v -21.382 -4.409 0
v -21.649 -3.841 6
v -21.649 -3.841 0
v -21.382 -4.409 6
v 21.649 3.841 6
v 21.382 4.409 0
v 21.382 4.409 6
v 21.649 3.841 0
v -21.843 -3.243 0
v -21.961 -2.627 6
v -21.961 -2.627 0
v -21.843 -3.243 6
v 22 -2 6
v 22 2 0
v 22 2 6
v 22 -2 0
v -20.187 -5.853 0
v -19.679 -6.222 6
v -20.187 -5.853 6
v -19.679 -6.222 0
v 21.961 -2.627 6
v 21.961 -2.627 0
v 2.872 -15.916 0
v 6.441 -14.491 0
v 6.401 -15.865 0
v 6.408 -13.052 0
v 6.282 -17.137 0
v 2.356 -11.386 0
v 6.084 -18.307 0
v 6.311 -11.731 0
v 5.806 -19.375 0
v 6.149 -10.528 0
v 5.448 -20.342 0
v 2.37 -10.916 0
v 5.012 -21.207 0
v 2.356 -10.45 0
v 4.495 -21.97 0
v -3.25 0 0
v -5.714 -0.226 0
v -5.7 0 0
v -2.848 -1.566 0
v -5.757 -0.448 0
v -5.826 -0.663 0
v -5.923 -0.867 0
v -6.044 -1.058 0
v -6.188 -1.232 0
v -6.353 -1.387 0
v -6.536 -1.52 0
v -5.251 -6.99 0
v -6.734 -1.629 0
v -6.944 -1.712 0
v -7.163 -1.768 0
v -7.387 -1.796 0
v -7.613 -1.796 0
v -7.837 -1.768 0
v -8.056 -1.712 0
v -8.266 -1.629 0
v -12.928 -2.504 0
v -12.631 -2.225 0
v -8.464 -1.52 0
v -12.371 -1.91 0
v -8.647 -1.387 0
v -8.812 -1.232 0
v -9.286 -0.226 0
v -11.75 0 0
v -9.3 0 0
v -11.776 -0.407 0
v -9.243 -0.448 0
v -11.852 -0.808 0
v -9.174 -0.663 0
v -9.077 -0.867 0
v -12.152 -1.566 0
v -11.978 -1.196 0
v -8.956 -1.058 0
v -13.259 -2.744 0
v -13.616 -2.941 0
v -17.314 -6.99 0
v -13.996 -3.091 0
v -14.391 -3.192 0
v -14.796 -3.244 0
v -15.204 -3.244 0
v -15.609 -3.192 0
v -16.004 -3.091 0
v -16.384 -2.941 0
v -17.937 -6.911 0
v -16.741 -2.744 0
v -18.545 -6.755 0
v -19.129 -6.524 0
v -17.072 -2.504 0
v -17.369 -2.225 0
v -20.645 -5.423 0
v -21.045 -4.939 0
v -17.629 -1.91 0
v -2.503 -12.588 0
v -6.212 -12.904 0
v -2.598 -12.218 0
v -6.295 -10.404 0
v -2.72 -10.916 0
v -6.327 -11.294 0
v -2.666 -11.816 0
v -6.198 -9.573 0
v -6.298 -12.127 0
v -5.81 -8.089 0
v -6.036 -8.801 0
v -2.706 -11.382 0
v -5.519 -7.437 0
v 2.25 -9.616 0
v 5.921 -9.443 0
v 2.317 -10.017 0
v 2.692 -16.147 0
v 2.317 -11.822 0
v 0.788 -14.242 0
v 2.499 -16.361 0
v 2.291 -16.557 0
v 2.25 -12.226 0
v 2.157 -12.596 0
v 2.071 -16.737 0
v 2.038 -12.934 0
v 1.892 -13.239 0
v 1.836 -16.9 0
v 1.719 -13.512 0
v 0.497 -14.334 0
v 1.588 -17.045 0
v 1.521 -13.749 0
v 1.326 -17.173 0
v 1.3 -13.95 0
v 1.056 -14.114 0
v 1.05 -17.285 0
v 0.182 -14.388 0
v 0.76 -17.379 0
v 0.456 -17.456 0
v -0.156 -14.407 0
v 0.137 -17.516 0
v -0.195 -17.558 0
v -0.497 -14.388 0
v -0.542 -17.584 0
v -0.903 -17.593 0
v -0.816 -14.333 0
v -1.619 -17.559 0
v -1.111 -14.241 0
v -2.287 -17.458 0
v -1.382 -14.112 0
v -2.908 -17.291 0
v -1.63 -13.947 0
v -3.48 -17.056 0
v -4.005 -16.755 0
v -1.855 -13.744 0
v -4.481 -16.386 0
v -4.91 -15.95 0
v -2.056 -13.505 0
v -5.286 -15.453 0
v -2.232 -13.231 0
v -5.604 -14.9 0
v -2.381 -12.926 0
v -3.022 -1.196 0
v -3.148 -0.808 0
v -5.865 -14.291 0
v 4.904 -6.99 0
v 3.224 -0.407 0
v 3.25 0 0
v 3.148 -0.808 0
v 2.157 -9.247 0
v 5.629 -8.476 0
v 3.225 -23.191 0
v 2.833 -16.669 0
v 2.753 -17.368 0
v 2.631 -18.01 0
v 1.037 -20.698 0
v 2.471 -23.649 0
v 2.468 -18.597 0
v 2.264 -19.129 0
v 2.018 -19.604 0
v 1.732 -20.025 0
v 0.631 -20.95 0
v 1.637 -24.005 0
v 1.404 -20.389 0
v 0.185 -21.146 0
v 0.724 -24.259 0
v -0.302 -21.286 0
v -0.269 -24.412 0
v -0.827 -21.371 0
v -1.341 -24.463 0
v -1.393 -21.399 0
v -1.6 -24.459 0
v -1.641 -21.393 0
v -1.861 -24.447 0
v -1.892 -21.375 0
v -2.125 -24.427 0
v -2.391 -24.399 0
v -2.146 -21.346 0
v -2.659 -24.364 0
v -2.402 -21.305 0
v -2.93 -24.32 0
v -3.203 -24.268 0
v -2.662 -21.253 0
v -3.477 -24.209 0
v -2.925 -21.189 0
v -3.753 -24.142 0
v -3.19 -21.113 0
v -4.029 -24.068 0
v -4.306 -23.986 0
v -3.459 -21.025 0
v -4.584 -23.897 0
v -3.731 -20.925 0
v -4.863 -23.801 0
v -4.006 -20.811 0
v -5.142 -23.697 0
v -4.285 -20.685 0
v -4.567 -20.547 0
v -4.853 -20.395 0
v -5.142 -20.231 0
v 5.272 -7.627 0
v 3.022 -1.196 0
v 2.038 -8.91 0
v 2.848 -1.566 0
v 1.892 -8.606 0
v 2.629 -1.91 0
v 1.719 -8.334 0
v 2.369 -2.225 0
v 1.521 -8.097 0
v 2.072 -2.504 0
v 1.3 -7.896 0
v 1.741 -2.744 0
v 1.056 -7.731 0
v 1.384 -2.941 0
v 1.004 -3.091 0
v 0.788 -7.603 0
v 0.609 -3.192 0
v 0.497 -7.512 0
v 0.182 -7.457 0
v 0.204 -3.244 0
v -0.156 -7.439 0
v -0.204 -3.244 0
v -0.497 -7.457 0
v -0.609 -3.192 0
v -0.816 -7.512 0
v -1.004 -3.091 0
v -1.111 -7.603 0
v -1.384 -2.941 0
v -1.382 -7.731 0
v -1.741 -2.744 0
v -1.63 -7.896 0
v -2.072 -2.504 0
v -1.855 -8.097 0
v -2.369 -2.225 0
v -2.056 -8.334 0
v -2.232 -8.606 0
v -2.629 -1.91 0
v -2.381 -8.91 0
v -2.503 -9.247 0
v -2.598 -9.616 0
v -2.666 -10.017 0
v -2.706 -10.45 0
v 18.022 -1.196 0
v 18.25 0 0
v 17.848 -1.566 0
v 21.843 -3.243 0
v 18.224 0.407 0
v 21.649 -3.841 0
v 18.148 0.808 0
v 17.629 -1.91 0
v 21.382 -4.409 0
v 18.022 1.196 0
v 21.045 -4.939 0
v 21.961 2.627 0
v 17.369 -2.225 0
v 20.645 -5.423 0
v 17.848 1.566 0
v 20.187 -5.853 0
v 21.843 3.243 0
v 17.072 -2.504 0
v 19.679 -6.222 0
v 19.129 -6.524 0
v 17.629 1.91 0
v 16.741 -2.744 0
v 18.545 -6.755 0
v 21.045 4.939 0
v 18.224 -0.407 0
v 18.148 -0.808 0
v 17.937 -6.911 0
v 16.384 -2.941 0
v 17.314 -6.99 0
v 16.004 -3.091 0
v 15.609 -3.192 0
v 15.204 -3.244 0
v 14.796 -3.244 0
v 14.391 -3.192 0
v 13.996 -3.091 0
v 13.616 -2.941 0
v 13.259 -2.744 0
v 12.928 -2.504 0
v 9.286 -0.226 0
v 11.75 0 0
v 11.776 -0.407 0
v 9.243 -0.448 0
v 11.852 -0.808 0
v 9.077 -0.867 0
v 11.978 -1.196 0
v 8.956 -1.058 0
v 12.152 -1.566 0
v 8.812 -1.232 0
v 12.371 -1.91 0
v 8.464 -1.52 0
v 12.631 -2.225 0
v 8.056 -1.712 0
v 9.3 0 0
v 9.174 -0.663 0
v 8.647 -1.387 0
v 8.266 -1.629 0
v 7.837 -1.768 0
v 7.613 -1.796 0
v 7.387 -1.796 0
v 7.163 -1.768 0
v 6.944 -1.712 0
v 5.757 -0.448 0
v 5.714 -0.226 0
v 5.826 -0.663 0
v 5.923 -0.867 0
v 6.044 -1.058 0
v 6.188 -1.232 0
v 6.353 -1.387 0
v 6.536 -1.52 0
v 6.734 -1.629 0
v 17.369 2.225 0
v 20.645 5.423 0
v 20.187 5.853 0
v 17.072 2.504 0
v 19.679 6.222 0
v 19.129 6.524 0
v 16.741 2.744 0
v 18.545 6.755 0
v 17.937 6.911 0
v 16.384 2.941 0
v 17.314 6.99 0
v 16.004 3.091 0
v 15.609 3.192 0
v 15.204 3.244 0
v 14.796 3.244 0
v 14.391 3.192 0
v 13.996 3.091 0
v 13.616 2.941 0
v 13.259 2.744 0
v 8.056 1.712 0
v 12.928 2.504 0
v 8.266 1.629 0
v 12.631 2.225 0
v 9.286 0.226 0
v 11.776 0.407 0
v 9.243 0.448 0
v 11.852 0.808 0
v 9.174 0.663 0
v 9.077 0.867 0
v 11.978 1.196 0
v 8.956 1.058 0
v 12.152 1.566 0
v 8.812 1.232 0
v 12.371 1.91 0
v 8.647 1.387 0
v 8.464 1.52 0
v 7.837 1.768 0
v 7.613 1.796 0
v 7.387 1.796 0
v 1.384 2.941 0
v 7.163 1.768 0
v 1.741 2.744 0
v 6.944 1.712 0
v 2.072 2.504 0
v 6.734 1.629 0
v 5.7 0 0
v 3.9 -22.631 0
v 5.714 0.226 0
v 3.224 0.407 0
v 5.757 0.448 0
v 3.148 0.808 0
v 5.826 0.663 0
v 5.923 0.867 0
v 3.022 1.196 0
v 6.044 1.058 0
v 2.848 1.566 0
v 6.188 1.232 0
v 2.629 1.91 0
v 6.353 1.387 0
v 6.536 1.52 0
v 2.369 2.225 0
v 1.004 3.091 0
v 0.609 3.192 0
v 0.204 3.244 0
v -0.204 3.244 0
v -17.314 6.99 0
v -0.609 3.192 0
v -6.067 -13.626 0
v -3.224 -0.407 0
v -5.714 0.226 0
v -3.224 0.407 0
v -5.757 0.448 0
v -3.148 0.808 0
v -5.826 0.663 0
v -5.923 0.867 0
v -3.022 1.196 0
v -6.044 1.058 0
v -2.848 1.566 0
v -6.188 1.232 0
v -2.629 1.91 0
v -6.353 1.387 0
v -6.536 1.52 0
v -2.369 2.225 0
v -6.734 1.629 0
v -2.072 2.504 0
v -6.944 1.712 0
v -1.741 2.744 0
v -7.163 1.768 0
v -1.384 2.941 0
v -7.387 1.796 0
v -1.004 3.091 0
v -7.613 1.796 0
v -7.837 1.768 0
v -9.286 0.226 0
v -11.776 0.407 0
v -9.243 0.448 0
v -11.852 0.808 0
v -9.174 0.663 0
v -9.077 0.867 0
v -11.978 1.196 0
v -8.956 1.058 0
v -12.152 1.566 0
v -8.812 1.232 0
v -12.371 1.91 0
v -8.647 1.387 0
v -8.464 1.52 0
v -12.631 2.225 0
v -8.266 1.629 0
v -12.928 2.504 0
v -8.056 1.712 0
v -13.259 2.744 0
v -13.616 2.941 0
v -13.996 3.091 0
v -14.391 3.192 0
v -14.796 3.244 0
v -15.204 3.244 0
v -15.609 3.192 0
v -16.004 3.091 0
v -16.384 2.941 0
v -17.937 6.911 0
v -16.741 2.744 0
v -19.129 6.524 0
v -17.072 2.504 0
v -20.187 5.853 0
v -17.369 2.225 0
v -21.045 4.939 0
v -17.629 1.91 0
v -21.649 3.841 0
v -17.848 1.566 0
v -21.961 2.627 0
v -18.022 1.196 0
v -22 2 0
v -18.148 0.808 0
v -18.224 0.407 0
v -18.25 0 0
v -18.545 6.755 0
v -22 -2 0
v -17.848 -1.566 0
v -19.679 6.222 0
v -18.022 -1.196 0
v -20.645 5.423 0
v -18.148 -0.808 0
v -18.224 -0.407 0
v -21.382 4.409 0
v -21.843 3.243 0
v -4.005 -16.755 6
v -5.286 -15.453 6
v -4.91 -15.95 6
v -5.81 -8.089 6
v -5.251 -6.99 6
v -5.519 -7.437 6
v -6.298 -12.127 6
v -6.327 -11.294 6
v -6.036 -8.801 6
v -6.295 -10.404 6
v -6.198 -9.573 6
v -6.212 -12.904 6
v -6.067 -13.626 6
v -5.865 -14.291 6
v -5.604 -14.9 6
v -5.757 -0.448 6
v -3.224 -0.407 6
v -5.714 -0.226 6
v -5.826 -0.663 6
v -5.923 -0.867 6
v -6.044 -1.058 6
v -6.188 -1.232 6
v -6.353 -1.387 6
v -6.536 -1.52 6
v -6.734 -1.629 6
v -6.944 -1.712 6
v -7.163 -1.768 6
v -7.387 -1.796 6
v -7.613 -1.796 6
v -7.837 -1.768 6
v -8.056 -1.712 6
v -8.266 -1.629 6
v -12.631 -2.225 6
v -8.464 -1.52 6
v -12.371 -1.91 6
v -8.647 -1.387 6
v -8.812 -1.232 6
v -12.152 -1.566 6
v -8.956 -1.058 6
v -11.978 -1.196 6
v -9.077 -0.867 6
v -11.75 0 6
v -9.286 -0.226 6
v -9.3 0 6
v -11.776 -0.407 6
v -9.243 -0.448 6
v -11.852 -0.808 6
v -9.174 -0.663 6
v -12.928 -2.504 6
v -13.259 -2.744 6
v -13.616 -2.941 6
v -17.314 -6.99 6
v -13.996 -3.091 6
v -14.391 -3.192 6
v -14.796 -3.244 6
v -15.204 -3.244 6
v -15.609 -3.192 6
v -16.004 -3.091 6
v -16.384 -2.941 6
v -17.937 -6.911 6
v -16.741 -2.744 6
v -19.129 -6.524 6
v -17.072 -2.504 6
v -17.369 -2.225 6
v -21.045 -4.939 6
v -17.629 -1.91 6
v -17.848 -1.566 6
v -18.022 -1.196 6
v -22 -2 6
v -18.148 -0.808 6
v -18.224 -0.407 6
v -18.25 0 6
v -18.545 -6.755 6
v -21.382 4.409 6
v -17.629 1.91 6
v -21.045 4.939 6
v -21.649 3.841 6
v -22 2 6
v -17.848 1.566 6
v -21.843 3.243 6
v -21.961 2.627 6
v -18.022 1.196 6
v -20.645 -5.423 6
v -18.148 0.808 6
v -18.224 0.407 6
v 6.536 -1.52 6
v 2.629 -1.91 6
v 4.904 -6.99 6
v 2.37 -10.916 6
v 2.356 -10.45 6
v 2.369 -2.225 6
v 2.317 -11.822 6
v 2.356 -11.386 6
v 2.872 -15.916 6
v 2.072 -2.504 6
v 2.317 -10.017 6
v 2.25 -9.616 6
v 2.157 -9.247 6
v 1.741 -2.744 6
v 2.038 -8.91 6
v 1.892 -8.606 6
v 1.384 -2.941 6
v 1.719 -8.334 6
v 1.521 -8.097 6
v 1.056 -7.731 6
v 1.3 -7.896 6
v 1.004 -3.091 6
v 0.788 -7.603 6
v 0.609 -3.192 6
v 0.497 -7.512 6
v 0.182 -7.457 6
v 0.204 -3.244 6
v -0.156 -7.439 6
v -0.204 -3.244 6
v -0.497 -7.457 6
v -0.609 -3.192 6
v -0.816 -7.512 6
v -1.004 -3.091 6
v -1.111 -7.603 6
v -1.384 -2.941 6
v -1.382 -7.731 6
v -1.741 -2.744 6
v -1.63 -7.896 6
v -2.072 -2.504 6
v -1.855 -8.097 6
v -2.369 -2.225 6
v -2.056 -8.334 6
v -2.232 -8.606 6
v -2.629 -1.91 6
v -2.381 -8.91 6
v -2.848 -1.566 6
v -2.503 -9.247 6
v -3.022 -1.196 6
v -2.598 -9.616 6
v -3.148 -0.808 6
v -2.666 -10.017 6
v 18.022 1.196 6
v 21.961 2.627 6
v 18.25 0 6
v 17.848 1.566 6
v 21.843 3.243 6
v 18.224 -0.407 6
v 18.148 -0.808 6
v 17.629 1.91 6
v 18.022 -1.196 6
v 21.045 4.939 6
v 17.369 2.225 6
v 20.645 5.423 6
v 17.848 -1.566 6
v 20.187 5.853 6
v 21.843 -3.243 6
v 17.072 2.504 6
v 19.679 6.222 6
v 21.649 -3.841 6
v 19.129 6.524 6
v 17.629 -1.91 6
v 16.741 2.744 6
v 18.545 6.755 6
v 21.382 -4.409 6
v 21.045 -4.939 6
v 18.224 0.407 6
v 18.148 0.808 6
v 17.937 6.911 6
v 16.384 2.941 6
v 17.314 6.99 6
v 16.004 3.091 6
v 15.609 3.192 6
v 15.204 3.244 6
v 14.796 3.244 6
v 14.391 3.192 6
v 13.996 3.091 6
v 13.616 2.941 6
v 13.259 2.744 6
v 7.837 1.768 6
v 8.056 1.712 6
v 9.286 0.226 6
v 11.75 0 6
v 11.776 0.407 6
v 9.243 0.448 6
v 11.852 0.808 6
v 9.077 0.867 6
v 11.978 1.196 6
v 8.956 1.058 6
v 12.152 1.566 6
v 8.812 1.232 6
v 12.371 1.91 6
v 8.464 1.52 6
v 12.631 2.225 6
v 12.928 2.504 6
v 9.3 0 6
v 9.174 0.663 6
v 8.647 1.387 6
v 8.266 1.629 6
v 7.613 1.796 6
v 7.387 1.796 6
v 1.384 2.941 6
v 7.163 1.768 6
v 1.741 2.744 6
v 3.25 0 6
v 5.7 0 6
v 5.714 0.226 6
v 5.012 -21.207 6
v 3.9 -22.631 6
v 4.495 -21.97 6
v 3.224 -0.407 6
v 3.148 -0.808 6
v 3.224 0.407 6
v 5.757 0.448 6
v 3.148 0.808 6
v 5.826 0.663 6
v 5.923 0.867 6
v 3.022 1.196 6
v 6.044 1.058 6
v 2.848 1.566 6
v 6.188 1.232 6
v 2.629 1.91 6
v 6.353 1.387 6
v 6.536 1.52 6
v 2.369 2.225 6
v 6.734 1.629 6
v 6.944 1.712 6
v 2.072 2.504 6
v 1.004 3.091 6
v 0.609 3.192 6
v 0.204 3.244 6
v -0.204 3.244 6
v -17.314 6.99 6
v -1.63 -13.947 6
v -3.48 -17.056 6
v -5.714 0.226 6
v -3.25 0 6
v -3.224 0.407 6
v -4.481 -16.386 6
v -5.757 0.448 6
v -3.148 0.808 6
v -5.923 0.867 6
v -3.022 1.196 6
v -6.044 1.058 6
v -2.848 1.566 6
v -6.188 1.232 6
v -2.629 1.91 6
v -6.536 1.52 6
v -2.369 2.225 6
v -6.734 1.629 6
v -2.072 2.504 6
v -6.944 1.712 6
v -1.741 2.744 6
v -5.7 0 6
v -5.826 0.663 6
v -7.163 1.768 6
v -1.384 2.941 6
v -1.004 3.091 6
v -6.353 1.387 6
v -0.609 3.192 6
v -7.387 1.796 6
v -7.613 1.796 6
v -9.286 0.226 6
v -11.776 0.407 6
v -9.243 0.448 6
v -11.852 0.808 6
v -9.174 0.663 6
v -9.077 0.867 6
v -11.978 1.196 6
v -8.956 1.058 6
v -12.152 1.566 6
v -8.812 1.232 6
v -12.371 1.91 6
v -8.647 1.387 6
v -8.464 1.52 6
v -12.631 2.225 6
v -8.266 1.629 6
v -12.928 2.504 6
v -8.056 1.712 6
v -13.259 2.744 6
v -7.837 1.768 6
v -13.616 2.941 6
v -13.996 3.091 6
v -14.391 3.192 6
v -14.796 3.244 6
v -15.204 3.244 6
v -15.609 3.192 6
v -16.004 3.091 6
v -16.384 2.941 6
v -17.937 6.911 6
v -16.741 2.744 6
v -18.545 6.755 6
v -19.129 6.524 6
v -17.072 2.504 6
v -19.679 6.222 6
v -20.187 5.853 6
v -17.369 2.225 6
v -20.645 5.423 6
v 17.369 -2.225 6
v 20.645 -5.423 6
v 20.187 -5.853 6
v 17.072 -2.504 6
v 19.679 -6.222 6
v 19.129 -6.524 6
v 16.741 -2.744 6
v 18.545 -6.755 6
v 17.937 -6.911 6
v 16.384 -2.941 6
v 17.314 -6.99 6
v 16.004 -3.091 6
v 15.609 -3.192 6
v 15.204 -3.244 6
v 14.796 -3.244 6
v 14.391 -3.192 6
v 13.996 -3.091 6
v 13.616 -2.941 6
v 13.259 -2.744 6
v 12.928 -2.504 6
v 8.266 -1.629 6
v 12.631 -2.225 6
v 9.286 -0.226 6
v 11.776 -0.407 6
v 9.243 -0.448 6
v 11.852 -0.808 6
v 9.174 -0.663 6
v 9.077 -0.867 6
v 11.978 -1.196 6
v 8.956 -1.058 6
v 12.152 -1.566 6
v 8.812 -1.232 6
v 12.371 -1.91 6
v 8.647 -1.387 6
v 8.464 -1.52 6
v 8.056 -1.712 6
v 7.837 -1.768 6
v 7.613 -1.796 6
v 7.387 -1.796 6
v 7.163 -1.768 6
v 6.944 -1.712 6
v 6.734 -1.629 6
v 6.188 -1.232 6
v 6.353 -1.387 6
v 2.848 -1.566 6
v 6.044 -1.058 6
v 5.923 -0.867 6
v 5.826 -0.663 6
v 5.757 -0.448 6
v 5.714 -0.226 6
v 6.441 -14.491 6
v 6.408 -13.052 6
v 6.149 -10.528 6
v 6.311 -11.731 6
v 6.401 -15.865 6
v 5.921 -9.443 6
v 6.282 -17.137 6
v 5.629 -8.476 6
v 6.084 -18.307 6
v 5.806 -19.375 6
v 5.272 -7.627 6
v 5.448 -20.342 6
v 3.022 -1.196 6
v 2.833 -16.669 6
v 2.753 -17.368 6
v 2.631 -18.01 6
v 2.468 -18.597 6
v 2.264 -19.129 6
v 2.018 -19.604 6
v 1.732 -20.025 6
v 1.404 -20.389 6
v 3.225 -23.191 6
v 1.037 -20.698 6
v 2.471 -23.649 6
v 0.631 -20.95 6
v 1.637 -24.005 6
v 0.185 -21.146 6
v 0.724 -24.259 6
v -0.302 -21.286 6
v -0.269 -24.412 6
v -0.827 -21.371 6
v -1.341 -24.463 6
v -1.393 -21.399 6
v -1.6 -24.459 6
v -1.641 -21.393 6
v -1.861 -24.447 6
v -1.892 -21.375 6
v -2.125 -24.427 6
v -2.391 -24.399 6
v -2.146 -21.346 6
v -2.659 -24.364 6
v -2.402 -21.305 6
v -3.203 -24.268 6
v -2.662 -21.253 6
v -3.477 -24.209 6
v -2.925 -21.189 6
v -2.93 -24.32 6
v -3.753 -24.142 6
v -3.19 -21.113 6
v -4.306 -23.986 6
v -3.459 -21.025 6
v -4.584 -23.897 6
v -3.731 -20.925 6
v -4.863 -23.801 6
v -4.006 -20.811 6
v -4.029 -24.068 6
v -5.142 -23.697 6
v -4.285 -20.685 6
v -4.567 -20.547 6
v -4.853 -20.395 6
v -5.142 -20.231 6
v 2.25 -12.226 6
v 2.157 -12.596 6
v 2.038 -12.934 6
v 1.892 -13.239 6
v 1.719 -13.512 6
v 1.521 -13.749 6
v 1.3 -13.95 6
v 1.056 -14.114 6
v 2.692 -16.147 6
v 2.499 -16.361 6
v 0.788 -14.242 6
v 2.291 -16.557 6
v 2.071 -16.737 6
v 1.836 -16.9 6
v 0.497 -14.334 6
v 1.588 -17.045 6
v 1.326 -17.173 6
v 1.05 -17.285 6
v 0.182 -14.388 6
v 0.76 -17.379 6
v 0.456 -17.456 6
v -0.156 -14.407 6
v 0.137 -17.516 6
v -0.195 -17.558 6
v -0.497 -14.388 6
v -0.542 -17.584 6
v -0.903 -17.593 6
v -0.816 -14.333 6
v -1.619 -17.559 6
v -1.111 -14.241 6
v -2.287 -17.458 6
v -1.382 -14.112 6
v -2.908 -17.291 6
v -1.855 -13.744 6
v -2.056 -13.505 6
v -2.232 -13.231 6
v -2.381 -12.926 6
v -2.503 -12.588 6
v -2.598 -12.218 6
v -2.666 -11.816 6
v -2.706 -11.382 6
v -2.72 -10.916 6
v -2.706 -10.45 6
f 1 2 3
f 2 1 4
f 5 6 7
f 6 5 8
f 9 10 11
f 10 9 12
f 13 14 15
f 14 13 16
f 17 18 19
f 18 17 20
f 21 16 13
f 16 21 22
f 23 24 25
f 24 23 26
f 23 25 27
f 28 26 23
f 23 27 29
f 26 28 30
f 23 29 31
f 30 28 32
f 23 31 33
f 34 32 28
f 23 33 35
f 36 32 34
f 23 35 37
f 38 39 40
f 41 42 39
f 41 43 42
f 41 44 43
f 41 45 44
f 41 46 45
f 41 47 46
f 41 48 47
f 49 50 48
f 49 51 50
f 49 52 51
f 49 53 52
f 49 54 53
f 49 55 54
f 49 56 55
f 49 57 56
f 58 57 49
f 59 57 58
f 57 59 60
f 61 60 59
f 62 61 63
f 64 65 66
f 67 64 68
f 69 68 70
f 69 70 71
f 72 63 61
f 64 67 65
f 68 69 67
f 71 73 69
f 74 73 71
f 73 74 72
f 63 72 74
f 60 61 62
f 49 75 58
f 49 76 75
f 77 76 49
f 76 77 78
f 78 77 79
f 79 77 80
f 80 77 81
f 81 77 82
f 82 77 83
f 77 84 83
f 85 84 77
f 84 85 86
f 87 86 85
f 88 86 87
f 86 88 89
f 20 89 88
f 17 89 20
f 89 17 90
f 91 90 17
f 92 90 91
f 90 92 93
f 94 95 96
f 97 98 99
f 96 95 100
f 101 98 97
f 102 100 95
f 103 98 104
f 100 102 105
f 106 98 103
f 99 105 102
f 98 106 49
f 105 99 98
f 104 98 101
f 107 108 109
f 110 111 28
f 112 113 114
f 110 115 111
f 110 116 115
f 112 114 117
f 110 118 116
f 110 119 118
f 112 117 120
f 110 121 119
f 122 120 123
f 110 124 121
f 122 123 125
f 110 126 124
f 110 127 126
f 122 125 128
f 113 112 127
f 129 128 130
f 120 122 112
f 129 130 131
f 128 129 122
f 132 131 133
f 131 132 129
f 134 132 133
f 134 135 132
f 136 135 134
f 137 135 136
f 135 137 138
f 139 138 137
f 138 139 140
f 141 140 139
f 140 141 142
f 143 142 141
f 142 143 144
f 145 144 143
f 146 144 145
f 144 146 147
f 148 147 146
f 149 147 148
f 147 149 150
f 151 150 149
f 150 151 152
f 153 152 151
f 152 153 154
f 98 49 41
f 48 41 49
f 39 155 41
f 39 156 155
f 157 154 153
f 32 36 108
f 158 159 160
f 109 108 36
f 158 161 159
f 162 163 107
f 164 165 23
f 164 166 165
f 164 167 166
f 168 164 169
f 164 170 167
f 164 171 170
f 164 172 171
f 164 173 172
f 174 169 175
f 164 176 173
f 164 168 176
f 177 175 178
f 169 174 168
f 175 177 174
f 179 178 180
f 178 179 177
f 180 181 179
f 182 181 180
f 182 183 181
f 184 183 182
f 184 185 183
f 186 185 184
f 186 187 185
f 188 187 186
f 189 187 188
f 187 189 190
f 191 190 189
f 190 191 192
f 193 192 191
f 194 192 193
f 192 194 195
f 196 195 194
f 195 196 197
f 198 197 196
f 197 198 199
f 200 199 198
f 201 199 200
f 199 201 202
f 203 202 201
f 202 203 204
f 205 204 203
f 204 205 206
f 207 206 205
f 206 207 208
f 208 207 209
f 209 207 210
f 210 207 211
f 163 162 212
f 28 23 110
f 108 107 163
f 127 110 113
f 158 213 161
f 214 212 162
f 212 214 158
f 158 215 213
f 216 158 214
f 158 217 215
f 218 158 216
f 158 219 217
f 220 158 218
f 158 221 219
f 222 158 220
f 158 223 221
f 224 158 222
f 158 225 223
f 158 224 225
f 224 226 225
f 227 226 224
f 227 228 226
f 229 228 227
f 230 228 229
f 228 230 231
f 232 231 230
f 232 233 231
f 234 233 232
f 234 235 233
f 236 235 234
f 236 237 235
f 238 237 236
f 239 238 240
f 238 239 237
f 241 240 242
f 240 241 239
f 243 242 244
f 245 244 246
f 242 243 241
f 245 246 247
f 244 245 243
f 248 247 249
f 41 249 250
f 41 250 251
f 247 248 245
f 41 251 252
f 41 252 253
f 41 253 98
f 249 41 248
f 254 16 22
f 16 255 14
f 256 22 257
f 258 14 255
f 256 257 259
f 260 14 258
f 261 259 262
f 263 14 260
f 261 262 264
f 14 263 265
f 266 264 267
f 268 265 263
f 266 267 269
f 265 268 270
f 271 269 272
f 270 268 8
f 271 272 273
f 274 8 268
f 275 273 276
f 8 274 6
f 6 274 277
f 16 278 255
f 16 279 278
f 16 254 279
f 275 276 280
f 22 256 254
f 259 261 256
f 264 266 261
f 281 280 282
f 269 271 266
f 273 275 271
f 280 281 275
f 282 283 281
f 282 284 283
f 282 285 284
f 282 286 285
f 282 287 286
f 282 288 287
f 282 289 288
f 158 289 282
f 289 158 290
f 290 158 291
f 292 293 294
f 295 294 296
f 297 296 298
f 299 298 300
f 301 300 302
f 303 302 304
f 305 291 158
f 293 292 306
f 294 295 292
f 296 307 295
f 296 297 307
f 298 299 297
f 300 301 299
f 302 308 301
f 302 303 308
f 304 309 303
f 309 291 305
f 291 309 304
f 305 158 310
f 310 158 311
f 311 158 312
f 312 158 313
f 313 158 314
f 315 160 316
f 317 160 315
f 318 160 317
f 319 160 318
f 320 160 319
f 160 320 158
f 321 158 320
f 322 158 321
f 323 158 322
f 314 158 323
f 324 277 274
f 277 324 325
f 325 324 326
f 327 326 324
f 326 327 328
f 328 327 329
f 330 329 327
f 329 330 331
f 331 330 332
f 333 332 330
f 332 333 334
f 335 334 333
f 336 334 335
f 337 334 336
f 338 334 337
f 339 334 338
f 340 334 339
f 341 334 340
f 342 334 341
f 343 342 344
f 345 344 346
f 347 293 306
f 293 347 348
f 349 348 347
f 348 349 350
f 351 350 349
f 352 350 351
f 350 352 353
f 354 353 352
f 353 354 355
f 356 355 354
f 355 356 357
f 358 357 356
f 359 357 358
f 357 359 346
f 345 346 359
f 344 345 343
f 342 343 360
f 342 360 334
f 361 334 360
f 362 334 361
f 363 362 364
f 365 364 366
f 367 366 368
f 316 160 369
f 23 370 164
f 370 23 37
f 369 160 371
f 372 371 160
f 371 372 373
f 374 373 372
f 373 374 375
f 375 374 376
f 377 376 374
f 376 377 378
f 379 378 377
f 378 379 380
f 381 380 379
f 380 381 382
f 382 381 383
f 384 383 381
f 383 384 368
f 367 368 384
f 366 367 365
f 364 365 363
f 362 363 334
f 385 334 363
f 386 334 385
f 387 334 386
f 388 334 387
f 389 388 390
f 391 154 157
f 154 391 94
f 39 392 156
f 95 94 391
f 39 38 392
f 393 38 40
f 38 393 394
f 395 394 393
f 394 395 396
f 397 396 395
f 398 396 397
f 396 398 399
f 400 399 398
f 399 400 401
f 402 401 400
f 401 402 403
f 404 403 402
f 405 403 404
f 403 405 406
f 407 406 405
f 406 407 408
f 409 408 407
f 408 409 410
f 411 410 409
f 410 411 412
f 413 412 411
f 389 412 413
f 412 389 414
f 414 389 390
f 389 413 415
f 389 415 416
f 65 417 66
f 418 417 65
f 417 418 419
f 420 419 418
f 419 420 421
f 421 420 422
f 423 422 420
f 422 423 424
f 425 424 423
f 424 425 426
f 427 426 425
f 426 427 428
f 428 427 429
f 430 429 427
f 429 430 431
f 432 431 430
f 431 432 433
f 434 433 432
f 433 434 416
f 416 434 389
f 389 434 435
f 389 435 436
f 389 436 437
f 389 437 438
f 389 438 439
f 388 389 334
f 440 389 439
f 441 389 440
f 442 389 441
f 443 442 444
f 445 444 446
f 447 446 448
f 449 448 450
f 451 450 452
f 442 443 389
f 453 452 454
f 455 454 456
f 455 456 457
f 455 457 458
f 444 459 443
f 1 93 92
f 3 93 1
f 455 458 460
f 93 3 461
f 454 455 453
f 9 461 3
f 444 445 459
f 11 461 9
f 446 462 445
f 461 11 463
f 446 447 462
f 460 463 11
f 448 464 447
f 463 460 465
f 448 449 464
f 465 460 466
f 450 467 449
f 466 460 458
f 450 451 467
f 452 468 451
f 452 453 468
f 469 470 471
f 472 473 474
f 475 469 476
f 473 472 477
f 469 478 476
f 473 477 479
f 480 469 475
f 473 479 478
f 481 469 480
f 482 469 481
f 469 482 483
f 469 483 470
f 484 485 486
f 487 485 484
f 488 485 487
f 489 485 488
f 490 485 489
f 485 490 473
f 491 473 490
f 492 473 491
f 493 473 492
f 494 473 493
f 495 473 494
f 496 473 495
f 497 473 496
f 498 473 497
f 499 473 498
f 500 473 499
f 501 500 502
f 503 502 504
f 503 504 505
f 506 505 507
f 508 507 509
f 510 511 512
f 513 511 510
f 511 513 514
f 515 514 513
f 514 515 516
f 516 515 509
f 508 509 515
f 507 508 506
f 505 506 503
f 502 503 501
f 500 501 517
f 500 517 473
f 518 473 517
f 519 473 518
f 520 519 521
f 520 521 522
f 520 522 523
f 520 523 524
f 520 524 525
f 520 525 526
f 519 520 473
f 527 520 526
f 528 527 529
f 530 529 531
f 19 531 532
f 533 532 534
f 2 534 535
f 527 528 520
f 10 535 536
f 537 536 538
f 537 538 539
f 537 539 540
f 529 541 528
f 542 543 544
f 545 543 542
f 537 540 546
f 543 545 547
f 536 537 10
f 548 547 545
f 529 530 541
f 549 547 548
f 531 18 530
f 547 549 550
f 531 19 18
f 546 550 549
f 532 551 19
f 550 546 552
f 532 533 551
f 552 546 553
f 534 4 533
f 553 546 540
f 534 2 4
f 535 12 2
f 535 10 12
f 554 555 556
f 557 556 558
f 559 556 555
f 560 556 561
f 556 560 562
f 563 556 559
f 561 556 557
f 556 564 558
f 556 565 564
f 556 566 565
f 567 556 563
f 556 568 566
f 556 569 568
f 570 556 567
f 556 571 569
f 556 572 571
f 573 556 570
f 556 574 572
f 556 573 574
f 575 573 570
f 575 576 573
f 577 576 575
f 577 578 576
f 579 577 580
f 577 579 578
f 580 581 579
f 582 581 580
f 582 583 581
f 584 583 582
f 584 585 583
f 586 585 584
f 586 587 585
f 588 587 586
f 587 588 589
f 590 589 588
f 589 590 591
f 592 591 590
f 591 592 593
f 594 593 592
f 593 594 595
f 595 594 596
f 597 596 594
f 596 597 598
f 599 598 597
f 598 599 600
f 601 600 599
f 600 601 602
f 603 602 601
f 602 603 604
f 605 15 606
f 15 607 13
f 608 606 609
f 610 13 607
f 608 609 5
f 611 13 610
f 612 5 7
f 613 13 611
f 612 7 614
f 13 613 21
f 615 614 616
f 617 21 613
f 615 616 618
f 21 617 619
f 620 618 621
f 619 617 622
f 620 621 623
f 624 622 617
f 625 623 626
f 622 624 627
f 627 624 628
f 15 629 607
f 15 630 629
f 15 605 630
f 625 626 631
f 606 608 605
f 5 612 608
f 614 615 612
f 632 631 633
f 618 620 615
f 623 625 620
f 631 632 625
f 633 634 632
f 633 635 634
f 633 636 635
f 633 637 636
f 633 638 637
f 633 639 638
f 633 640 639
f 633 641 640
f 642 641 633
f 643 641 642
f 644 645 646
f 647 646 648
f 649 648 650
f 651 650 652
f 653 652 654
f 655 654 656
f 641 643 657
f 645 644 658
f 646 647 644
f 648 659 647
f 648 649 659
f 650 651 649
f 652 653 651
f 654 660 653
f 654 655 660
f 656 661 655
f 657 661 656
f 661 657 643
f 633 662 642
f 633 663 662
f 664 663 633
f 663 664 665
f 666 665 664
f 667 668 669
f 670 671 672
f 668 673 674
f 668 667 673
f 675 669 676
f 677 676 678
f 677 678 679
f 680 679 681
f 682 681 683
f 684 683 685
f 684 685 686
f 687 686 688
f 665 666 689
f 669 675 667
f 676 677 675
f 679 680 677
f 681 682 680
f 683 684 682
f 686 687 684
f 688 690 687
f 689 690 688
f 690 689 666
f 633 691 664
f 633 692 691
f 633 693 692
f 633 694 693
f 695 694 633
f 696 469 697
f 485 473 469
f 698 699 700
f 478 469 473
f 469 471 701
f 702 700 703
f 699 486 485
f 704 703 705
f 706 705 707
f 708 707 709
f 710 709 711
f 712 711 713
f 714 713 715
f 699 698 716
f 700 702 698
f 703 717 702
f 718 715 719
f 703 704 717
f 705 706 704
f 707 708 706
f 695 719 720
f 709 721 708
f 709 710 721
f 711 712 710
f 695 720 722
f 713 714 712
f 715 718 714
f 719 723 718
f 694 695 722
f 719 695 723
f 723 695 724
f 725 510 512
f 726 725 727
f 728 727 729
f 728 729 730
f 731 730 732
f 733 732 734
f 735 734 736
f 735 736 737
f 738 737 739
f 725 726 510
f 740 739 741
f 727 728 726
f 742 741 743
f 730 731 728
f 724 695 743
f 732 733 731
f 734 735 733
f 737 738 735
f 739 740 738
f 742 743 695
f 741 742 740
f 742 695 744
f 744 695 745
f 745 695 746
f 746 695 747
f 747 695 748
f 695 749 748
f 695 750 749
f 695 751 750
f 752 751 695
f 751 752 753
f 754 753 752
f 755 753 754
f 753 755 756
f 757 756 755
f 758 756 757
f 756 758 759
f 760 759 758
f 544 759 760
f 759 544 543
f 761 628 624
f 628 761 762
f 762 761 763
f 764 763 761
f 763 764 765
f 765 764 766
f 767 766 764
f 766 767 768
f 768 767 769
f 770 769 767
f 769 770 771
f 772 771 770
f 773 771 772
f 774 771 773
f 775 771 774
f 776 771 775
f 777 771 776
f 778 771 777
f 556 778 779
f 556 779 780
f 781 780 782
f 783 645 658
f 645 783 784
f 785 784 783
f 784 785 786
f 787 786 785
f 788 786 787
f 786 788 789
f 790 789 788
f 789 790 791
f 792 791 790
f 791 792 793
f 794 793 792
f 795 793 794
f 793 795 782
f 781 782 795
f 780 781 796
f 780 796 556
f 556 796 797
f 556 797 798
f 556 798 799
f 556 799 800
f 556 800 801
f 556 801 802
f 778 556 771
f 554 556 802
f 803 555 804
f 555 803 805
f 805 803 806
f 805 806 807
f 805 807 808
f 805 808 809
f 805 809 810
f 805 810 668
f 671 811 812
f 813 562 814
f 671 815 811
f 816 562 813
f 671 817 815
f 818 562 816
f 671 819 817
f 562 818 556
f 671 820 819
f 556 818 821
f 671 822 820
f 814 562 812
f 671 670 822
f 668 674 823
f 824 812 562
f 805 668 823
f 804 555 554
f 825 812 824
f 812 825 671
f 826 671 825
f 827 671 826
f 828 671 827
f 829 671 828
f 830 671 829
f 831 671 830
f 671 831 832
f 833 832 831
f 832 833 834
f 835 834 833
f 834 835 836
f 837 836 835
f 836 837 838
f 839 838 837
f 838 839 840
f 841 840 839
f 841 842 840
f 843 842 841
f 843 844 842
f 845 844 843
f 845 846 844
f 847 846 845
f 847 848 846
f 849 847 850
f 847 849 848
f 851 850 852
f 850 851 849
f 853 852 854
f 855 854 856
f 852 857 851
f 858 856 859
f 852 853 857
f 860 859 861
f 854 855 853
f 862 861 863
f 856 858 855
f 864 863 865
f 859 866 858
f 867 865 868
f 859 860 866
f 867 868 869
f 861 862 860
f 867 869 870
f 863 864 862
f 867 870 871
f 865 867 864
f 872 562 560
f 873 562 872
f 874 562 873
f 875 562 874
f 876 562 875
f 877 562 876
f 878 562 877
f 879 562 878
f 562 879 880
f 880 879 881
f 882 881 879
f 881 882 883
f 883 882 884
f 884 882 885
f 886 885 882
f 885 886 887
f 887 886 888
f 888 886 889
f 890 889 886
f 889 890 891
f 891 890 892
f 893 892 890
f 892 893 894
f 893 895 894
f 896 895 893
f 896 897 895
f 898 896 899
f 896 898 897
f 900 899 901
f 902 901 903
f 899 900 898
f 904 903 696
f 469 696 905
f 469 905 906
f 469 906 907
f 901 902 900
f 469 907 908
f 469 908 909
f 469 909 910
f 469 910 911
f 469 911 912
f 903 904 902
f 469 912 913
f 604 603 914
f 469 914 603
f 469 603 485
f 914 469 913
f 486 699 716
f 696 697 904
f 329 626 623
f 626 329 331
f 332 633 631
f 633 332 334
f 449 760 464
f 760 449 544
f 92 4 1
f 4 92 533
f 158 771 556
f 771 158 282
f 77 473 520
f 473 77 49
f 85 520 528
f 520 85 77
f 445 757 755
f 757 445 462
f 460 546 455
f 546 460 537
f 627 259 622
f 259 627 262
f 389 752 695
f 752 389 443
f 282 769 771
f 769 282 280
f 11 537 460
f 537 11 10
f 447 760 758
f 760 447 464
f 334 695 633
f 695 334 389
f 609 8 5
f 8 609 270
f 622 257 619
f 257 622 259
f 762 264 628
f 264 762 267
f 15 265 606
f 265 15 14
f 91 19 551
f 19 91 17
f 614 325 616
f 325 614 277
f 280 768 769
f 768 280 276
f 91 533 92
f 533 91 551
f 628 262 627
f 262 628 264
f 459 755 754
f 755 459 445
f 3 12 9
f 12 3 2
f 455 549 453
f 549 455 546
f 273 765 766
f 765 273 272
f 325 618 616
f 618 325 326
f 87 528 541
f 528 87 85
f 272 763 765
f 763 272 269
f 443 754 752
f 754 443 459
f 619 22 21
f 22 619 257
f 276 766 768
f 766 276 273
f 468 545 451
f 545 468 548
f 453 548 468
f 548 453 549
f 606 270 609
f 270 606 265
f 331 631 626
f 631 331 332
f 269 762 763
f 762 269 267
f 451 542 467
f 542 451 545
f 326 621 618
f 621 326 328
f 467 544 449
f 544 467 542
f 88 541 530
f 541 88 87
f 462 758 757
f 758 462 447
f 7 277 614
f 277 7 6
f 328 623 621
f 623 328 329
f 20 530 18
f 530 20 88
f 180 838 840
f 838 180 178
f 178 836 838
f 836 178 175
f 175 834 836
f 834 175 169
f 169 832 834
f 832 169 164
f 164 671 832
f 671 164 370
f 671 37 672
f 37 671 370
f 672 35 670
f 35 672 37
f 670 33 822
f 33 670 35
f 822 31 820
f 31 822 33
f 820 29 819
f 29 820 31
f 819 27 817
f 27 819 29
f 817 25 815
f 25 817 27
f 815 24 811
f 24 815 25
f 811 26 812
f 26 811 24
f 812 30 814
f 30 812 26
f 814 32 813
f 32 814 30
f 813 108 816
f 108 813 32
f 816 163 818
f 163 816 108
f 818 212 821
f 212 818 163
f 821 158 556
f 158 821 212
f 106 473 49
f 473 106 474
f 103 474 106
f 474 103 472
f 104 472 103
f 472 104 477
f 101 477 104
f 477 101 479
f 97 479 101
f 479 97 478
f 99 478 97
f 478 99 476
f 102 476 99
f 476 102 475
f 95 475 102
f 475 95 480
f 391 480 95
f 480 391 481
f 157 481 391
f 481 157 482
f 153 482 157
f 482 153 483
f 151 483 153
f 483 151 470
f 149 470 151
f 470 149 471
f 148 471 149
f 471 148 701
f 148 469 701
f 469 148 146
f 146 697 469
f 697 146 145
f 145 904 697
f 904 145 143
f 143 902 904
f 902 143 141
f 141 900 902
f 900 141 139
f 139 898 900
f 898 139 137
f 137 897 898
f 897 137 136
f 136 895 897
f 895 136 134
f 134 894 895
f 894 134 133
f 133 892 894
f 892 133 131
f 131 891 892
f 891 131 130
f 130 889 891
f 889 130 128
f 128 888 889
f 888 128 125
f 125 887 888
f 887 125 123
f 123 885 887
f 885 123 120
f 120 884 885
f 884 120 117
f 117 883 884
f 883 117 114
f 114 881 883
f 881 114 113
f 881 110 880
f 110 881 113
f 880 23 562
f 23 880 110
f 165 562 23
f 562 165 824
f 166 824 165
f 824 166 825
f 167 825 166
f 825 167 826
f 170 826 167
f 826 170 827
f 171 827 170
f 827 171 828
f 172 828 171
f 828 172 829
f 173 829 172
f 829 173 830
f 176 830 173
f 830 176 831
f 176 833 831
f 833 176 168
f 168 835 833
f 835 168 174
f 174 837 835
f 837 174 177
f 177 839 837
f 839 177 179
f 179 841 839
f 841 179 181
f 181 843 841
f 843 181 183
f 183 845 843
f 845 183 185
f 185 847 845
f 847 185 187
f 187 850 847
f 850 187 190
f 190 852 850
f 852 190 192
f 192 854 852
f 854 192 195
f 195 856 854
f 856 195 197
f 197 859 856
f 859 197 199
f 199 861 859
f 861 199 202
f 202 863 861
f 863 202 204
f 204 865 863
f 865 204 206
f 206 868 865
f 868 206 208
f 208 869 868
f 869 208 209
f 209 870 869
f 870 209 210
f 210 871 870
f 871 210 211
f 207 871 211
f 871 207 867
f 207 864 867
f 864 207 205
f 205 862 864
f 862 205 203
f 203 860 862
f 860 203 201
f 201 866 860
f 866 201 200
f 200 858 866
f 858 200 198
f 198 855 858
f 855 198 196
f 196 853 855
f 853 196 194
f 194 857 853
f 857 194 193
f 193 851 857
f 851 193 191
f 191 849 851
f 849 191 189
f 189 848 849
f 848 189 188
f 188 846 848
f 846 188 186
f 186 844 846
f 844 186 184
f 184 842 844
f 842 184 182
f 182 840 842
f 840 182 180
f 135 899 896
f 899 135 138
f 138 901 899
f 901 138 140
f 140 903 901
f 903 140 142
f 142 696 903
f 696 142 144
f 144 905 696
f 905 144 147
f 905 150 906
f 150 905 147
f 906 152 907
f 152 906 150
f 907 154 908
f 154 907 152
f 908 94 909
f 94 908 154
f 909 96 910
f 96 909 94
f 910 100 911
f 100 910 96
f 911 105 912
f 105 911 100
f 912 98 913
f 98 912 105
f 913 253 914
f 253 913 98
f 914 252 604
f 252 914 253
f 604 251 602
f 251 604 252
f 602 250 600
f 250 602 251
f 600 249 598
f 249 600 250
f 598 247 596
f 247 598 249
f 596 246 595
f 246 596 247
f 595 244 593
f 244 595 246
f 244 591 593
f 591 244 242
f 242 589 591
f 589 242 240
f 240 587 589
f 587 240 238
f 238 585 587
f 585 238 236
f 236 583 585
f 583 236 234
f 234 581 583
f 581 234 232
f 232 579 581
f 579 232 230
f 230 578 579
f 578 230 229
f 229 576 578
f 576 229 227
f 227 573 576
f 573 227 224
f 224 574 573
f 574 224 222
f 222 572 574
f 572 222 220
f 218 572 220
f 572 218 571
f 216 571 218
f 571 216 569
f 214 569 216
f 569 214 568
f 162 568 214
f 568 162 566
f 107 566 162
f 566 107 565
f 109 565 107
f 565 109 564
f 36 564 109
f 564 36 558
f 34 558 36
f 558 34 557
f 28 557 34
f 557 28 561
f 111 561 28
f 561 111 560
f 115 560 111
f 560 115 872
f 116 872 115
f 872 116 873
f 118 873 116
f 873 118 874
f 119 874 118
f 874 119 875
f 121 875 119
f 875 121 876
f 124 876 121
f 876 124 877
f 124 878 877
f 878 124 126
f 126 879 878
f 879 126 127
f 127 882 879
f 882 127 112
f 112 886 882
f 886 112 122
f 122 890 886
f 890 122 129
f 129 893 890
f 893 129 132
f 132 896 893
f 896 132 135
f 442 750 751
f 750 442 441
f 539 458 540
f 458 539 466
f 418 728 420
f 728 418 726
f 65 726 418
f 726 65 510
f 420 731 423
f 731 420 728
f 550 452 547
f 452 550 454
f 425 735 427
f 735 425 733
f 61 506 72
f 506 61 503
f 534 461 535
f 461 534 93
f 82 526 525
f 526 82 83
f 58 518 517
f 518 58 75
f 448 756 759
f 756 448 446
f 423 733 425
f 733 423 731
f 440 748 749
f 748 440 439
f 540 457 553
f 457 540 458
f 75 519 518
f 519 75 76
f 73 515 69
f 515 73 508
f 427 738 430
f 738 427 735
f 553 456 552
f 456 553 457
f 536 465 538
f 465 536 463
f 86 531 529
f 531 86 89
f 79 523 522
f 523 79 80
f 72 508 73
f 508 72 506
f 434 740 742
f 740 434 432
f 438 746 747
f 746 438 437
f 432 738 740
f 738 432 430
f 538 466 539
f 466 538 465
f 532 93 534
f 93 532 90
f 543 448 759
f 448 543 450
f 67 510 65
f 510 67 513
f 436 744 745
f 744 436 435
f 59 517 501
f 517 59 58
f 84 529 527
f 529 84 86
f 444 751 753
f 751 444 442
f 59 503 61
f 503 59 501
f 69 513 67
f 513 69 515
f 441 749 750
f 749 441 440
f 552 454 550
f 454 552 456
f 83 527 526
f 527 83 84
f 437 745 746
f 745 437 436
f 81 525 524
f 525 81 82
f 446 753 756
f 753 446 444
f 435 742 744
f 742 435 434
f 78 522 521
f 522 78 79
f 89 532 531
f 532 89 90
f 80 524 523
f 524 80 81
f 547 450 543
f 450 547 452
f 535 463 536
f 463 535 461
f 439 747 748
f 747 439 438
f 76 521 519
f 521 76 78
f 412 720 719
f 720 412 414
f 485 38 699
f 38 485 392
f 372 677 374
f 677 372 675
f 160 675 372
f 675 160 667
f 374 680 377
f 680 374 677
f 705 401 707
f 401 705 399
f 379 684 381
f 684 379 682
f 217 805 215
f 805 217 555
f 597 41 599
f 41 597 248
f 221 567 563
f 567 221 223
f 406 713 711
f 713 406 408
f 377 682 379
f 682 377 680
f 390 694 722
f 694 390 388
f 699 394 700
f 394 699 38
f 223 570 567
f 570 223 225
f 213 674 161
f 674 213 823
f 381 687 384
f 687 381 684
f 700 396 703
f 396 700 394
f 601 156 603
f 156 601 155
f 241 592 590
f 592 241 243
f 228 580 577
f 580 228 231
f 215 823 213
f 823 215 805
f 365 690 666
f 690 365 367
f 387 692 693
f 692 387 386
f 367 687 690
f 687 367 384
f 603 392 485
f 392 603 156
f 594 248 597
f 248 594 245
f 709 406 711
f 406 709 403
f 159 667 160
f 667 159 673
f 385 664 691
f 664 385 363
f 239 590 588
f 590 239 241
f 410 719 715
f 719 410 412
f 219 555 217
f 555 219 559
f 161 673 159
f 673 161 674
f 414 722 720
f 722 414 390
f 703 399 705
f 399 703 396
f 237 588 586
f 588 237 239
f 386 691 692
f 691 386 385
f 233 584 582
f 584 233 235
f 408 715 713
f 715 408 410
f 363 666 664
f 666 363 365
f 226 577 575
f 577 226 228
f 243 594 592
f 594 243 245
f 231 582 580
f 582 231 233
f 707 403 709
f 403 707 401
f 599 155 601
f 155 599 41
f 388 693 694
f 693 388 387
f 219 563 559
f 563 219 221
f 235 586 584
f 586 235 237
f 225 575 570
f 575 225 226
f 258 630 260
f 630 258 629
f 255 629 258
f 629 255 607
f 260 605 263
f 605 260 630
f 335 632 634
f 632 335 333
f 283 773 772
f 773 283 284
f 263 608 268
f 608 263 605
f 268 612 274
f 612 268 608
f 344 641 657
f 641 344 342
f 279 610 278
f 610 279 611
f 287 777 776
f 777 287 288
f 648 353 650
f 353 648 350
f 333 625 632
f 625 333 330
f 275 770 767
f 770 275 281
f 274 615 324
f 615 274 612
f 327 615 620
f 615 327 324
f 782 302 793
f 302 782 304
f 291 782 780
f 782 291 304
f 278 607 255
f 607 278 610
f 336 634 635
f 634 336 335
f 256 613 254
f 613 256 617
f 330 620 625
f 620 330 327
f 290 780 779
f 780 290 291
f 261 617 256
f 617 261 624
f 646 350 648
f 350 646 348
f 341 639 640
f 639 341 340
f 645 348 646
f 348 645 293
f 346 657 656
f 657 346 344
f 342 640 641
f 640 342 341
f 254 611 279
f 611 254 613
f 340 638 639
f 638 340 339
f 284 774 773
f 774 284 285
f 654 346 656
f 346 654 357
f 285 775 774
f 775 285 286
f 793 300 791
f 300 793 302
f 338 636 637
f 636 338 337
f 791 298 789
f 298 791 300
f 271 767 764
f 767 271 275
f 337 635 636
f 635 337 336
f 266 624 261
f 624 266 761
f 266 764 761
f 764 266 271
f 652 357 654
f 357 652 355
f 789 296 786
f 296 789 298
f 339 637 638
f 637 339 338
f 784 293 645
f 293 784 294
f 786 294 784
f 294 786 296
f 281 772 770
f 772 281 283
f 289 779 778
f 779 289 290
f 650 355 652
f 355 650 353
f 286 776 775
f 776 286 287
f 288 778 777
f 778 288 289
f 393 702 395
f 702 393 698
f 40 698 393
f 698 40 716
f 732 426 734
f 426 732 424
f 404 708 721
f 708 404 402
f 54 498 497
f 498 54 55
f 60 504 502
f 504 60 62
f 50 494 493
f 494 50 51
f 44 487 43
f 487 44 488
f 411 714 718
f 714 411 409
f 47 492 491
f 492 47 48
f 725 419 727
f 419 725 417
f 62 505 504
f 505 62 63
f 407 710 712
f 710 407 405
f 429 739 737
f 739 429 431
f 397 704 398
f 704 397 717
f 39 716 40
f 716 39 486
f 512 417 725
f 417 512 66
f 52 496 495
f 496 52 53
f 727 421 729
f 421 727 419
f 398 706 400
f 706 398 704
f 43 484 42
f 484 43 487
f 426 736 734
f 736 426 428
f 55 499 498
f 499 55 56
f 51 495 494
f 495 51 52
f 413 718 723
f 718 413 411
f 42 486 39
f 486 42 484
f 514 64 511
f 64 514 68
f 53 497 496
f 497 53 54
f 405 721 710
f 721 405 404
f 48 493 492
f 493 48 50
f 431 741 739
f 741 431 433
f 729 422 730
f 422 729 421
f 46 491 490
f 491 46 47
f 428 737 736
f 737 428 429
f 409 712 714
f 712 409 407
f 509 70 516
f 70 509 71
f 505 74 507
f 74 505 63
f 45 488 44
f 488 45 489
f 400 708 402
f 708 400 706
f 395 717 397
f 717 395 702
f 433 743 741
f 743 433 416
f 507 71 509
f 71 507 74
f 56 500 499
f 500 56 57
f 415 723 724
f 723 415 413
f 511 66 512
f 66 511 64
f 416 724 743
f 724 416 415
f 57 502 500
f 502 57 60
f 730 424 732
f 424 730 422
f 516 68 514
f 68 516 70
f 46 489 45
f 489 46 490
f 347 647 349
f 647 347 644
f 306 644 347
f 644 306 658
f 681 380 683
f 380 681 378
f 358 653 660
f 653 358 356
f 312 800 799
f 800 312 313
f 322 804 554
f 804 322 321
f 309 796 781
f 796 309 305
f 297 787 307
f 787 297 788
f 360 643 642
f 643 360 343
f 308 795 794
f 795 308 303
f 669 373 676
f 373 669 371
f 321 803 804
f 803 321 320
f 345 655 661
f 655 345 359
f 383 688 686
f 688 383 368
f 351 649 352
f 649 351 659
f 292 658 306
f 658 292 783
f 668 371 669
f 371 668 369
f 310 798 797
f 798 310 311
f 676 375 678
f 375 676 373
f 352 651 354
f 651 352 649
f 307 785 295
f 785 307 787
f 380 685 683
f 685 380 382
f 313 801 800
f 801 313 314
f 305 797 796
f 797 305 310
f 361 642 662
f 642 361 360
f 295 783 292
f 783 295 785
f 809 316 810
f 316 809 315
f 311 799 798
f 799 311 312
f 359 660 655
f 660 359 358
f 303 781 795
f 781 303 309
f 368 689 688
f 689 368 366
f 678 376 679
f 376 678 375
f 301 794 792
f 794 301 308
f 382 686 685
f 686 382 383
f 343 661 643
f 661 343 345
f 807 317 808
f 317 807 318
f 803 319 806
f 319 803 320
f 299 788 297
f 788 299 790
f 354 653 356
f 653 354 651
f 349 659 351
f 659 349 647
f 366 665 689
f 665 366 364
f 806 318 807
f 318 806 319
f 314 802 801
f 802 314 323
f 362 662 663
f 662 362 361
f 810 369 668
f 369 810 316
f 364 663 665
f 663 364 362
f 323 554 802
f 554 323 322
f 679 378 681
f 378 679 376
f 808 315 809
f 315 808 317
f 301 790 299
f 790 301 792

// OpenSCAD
$fn = 50;


difference() {
	union() {
		hull() {
			translate(v = [-17.0000000000, 2.0000000000, 0]) {
				cylinder(h = 6, r = 5);
			}
			translate(v = [17.0000000000, 2.0000000000, 0]) {
				cylinder(h = 6, r = 5);
			}
			translate(v = [-17.0000000000, -2.0000000000, 0]) {
				cylinder(h = 6, r = 5);
			}
			translate(v = [17.0000000000, -2.0000000000, 0]) {
				cylinder(h = 6, r = 5);
			}
		}
		translate(v = [0, -5, 0]) {
			linear_extrude(height = 6) {
				text(font = "DejaVu Sans Mono:style=Bold", halign = "center", size = 19.0000000000, text = "9", valign = "top");
			}
		}
	}
	union() {
		translate(v = [-15.0000000000, 0.0000000000, 0]) {
			translate(v = [0, 0, -100]) {
				cylinder(h = 200, r = 3.2500000000);
			}
		}
		translate(v = [0, 0, -100]) {
			cylinder(h = 200, r = 3.2500000000);
		}
		translate(v = [15.0000000000, 0.0000000000, 0]) {
			translate(v = [0, 0, -100]) {
				cylinder(h = 200, r = 3.2500000000);
			}
		}
		translate(v = [-15.0000000000, 0.0000000000, 0]) {
			translate(v = [0, 0, -100]) {
				cylinder(h = 200, r = 1.8000000000);
			}
		}
		translate(v = [-7.5000000000, 0.0000000000, 0]) {
			translate(v = [0, 0, -100]) {
				cylinder(h = 200, r = 1.8000000000);
			}
		}
		translate(v = [0, 0, -100]) {
			cylinder(h = 200, r = 1.8000000000);
		}
		translate(v = [7.5000000000, 0.0000000000, 0]) {
			translate(v = [0, 0, -100]) {
				cylinder(h = 200, r = 1.8000000000);
			}
		}
		translate(v = [15.0000000000, 0.0000000000, 0]) {
			translate(v = [0, 0, -100]) {
				cylinder(h = 200, r = 1.8000000000);
			}
		}
	}
}
